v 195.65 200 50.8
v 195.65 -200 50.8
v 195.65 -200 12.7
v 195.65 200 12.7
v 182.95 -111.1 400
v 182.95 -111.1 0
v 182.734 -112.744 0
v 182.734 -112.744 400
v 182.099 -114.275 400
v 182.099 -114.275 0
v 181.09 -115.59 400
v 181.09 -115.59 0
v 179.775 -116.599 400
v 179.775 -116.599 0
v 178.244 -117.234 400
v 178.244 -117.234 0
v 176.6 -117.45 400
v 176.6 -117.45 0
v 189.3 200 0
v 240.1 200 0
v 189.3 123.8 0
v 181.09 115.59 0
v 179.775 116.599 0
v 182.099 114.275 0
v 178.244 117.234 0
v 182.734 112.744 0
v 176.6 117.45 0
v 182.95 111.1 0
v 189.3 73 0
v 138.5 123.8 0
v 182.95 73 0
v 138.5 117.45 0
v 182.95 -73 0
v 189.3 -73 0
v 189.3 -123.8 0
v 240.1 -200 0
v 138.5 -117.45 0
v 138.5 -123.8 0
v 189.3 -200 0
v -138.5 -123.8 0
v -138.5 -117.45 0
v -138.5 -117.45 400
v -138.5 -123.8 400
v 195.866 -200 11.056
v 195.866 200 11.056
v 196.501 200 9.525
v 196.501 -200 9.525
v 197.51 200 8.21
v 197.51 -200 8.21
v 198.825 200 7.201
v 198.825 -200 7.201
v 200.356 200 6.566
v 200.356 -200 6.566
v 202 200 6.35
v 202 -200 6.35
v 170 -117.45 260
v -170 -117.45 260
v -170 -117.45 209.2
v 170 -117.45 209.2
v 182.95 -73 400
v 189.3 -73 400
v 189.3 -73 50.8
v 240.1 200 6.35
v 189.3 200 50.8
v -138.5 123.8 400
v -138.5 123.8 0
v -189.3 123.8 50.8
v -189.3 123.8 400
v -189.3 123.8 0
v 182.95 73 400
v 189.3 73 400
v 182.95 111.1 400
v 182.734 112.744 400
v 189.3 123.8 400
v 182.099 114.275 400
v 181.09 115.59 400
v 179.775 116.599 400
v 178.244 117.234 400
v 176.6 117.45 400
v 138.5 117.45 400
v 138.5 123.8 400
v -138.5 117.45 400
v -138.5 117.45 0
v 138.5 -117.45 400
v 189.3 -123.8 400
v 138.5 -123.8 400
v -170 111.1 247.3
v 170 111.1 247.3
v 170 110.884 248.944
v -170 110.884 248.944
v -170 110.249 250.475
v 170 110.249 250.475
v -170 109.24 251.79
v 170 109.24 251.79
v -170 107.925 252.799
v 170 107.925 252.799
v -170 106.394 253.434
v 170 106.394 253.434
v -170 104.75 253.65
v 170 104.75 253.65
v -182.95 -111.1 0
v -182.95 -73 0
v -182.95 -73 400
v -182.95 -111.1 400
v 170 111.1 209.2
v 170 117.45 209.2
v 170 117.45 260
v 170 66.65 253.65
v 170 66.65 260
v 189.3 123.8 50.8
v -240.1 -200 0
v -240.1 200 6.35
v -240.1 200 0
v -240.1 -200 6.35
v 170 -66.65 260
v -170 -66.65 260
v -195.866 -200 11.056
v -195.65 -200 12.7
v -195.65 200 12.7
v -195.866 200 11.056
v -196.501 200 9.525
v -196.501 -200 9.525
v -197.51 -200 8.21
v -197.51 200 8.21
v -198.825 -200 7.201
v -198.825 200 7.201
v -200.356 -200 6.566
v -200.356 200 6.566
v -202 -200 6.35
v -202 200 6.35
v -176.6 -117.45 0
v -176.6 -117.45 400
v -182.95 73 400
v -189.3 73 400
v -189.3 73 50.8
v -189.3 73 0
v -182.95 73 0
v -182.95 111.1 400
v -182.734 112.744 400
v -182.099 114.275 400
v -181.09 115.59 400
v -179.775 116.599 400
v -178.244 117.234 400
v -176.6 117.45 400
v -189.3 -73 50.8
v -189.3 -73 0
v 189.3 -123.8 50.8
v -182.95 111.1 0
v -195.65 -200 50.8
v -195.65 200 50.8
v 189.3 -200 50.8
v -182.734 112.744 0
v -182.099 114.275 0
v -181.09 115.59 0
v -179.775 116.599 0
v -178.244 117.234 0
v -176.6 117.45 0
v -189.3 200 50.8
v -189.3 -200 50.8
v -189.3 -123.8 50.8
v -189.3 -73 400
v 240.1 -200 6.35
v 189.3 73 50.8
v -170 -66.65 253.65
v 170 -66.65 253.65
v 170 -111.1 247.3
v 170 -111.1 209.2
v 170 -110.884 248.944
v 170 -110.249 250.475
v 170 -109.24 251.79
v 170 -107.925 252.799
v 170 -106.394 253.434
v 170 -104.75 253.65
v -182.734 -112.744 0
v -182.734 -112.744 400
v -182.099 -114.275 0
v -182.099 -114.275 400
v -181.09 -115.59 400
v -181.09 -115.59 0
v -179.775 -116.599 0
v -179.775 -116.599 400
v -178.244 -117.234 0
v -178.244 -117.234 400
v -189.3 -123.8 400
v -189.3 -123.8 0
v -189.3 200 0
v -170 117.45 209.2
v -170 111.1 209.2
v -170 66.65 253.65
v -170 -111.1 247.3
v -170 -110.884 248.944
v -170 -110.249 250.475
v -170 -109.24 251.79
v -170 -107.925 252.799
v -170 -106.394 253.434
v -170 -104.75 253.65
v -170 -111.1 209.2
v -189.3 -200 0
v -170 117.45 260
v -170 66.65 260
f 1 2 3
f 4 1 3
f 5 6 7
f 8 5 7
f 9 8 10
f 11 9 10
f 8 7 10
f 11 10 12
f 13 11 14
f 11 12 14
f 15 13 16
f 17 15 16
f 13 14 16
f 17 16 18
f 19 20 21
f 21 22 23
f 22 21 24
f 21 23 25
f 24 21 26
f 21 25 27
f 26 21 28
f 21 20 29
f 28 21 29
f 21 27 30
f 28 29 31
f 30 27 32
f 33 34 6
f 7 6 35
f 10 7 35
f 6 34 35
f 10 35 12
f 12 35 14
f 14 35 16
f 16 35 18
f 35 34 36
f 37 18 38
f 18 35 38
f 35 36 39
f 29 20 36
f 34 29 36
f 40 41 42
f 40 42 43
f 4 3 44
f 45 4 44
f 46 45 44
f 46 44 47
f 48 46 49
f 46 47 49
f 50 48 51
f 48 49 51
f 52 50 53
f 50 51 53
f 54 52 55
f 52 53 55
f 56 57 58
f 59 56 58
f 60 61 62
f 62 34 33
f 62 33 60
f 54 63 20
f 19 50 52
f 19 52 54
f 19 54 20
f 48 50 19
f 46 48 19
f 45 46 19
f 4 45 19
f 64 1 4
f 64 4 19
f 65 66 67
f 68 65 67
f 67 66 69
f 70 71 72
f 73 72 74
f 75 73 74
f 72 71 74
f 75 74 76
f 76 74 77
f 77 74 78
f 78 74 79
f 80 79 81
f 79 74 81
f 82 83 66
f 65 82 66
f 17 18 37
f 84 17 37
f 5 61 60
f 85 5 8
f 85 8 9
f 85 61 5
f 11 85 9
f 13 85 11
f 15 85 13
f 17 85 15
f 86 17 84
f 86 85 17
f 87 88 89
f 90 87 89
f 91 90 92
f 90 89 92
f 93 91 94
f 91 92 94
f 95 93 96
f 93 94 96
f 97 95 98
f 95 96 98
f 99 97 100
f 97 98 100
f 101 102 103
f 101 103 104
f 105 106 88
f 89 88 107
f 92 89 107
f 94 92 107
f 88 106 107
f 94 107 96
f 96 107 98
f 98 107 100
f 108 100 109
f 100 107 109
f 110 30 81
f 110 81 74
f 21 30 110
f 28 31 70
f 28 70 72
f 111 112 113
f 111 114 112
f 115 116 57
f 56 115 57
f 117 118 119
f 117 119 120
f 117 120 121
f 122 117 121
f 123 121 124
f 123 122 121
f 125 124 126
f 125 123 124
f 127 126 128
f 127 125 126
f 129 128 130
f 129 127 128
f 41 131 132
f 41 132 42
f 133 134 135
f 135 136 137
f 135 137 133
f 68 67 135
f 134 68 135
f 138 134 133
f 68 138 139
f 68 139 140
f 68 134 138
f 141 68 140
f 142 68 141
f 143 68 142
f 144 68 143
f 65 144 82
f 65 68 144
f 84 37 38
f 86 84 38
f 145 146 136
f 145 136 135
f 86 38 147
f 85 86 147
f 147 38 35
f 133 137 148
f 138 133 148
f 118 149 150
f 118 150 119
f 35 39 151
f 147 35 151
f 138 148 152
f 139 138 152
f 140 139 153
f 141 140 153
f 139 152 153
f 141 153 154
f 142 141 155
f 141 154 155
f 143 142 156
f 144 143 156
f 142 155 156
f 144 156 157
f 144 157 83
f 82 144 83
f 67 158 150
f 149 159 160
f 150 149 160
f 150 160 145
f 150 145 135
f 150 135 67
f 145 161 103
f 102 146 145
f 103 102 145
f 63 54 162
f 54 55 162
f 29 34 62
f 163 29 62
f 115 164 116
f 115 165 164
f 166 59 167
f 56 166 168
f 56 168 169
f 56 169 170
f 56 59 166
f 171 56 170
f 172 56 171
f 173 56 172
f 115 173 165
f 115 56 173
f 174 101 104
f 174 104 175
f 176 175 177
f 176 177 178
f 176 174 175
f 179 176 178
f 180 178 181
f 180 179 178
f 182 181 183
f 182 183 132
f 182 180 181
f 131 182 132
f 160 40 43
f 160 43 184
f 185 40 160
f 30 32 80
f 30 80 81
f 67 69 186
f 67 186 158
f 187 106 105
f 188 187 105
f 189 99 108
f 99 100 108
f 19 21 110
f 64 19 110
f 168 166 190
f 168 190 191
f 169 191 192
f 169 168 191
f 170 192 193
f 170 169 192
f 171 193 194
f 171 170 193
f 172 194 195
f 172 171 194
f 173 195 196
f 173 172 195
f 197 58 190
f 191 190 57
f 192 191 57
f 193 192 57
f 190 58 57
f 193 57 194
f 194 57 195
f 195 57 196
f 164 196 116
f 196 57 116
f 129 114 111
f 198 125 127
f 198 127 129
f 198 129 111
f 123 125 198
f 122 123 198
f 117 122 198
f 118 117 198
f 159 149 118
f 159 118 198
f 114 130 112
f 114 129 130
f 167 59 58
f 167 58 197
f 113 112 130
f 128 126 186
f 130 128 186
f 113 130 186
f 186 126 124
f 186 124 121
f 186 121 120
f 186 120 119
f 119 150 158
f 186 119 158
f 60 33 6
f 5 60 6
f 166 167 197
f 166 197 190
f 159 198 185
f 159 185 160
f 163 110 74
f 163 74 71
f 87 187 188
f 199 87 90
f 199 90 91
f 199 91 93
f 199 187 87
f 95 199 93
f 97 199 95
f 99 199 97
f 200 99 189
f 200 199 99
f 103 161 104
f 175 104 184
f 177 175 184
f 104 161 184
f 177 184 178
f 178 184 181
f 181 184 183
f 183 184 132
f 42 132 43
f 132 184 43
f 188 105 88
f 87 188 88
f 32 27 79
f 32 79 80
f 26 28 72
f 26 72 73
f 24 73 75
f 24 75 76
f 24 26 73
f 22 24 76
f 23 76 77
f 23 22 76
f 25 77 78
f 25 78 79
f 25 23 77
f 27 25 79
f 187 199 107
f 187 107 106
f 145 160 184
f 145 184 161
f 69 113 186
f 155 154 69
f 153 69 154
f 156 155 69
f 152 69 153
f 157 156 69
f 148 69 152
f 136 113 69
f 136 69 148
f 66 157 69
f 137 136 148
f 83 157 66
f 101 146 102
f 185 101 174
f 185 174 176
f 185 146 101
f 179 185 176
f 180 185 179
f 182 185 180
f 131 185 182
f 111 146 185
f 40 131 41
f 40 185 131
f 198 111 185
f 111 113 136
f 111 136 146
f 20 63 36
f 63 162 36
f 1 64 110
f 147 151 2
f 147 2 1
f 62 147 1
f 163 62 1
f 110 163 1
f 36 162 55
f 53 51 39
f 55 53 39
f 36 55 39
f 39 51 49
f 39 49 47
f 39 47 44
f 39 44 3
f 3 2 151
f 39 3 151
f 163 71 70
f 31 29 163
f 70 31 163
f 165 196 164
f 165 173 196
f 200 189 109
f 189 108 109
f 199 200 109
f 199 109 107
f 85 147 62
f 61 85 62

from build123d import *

# Parameters (mm, degrees)
F1_DEPTH = 200
F3_DEPTH = 400
F6_DEPTH = 170


# Not quite as in the source:
# - a pattern or mirror of a feature is missing from the dataset's text; its kind, count and spacing are read off the source's solid


with BuildPart() as f1:
    # F0 (on Front) → F1 (new body, symmetric)
    with BuildSketch(Plane.XZ):
        with BuildLine():
            Line((-240.1, 0), (-189.3, 0))
            Line((-189.3, 0), (-189.3, 50.8))
            Line((-189.3, 50.8), (-195.65, 50.8))
            Line((-195.65, 50.8), (-195.65, 12.7))
            ThreePointArc((-195.65, 12.7), (-197.5098719395, 8.2098719395), (-202, 6.35))
            Line((-202, 6.35), (-240.1, 6.35))
            Line((-240.1, 6.35), (-240.1, 0))
        make_face()
    extrude(amount=F1_DEPTH, both=True)

    # F2 (on Top) → F3 (join)
    with BuildSketch(Plane.XY):
        with BuildLine():
            Line((-138.5, 123.8), (-189.3, 123.8))
            Line((-189.3, 123.8), (-189.3, 73))
            Line((-189.3, 73), (-182.95, 73))
            Line((-182.95, 73), (-182.95, 111.1))
            ThreePointArc((-182.95, 111.1), (-181.0901280605, 115.5901280605), (-176.6, 117.45))
            Line((-176.6, 117.45), (-138.5, 117.45))
            Line((-138.5, 117.45), (-138.5, 123.8))
        make_face()
    f3 = extrude(amount=F3_DEPTH)

    # F3_copies: F3 across plane
    add(f3.mirror(Plane(origin=(0, 0, 0), x_dir=(0, 0, -1), z_dir=(0, -1, 0))))


with BuildPart() as f4_1:
    # F4: instance of F1
    add(f1.part.mirror(Plane.YZ))


with BuildPart() as f6:
    # F5 (on Right) → F6 (new body, symmetric)
    with BuildSketch(Plane.YZ):
        with BuildLine():
            Line((-66.65, 260), (-117.45, 260))
            Line((-117.45, 260), (-117.45, 209.2))
            Line((-117.45, 209.2), (-111.1, 209.2))
            Line((-111.1, 209.2), (-111.1, 247.3))
            ThreePointArc((-111.1, 247.3), (-109.2401280605, 251.7901280605), (-104.75, 253.65))
            Line((-104.75, 253.65), (-66.65, 253.65))
            Line((-66.65, 253.65), (-66.65, 260))
        make_face()
    extrude(amount=F6_DEPTH, both=True)


with BuildPart() as f7_1:
    # F7: instance of F6
    add(f6.part.mirror(Plane.XZ))


solid = Compound([f1.part, f4_1.part, f6.part, f7_1.part])
